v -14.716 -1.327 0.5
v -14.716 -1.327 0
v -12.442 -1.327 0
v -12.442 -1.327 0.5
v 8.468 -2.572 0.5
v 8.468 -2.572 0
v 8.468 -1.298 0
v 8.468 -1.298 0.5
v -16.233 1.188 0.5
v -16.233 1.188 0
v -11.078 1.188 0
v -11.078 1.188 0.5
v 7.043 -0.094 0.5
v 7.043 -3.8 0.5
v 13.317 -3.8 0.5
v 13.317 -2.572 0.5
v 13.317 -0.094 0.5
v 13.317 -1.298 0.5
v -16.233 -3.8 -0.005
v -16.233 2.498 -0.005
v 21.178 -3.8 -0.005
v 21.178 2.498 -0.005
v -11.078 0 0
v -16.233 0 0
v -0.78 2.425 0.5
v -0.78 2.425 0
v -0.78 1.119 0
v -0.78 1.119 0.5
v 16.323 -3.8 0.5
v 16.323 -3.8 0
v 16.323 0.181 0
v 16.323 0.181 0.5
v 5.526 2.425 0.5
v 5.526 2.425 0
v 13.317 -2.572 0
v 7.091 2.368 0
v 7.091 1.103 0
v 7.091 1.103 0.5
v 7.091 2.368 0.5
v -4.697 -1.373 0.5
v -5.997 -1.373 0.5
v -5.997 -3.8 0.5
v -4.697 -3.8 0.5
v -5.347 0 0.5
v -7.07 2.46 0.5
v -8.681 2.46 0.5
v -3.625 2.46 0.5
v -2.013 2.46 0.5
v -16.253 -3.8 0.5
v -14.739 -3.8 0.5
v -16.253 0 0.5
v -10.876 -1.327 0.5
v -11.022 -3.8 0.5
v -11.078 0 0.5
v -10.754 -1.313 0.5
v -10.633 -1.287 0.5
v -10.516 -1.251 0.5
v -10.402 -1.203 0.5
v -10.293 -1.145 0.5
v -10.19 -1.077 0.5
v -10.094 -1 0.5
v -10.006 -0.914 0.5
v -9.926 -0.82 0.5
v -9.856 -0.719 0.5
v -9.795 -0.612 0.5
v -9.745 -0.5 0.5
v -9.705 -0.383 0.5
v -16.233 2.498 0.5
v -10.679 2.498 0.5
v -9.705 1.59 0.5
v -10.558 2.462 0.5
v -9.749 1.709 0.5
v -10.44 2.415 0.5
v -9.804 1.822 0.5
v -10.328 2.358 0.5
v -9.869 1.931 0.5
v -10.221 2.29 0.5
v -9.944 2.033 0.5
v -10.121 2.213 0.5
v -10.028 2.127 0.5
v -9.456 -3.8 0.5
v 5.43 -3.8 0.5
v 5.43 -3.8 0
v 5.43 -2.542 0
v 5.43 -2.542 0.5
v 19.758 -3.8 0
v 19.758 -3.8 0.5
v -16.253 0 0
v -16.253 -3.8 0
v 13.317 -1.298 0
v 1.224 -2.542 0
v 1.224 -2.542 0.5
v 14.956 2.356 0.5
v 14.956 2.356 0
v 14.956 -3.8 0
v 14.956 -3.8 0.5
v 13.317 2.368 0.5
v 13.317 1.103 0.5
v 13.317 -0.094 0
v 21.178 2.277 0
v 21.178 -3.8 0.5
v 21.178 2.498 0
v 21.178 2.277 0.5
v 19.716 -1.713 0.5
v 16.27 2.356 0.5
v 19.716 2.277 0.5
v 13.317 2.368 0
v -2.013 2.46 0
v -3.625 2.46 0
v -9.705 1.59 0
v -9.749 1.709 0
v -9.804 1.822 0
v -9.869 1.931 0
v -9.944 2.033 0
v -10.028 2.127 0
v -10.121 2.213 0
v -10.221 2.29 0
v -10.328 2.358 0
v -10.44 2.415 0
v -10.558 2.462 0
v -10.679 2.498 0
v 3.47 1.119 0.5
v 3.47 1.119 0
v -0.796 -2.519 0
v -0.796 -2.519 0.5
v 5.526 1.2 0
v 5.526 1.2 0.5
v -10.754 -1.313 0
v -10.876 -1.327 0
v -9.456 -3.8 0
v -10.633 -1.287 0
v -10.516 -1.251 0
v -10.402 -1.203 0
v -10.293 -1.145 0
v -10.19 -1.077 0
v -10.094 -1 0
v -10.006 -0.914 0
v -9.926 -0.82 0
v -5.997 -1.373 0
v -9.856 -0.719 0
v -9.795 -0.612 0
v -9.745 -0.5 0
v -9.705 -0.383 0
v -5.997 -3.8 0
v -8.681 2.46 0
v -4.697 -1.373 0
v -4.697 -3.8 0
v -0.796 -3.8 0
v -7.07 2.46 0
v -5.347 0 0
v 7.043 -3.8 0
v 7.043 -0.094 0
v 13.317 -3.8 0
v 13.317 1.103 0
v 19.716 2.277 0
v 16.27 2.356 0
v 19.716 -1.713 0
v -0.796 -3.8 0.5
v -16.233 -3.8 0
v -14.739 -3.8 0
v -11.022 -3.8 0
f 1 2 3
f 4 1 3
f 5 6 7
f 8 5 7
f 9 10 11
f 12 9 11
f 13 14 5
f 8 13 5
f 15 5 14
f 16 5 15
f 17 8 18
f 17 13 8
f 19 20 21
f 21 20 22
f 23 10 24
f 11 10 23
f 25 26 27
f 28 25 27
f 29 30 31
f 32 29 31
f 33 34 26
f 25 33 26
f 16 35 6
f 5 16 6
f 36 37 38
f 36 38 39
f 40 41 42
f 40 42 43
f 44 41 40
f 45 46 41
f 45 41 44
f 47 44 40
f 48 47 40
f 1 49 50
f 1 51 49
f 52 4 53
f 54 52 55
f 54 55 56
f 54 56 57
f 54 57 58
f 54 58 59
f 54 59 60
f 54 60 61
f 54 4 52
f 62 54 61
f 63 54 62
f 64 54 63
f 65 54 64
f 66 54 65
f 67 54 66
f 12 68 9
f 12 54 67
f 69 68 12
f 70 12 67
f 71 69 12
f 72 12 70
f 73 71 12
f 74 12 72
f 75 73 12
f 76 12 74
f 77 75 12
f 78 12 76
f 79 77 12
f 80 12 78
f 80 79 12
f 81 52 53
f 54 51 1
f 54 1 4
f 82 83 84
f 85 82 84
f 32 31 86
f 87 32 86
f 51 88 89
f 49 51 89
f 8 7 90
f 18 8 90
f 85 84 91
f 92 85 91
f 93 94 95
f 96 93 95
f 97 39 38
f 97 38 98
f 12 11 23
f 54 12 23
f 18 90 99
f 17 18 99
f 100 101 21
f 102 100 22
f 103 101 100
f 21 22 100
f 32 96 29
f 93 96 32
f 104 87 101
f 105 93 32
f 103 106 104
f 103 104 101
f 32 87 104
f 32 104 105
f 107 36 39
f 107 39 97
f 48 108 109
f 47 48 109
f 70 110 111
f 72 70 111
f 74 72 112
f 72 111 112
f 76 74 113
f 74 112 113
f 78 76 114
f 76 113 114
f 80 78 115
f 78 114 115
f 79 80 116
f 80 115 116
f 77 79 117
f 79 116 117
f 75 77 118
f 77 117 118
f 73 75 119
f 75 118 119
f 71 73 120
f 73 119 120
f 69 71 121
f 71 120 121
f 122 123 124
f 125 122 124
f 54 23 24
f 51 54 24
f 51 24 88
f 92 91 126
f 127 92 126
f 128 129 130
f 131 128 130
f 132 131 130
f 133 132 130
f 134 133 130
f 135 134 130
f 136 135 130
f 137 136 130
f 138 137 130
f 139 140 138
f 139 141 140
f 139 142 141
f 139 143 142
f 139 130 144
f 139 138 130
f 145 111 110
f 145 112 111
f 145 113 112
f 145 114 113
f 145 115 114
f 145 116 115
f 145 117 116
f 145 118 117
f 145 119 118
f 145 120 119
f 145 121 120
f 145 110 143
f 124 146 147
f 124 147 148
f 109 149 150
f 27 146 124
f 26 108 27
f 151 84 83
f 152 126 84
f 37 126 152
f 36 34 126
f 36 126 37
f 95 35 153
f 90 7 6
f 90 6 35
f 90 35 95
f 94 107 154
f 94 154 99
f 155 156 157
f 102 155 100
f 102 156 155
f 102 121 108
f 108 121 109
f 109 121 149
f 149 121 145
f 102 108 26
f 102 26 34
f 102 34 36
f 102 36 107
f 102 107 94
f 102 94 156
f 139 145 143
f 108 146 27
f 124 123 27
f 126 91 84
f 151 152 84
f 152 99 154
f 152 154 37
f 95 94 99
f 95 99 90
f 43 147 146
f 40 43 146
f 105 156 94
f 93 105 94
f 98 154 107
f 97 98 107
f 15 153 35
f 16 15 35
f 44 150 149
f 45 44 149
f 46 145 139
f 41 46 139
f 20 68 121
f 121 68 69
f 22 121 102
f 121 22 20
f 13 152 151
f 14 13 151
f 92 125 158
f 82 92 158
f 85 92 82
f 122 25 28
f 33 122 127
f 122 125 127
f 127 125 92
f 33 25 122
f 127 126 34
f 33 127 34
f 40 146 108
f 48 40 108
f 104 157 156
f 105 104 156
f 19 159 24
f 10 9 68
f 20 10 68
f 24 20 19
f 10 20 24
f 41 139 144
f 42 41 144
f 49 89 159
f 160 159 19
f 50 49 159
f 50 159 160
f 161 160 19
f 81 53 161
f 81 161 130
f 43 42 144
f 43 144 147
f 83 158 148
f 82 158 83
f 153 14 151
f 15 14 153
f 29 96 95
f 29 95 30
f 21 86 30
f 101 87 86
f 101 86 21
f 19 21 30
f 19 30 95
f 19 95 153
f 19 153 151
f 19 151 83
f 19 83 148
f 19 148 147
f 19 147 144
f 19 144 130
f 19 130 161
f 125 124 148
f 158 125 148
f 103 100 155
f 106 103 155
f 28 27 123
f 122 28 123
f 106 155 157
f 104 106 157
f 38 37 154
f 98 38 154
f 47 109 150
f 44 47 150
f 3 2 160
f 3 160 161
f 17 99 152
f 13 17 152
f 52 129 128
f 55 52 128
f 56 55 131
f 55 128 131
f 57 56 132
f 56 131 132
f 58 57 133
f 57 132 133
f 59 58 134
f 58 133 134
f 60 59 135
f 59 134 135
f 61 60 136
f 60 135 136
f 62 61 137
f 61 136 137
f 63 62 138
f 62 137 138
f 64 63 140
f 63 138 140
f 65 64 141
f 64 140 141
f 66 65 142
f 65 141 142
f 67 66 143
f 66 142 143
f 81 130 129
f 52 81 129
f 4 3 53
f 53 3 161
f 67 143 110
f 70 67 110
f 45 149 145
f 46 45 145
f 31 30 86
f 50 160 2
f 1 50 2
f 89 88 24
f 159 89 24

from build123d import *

# Parameters (mm, degrees)
F4_DEPTH = 1
F3_W     = 12.4513199553
F3_H     = 2.5294316001
F5_W     = 74.8214920866
F5_H     = 12.595169118
F6_DEPTH = 0.01
F7_SCALE = 0.5


with BuildPart() as f4:
    # F3 (on Top) → F4 (new body)
    with BuildSketch(Plane.XY):
        with BuildLine():
            Line((-32.5062275336, -7.6), (-29.4775575647, -7.6))
            Line((-29.4775575647, -7.6), (-29.4327614695, -2.6532297294))
            Line((-29.4327614695, -2.6532297294), (-24.8831383838, -2.6532297294))
            Line((-24.8831383838, -2.6532297294), (-22.0433248124, -7.6))
            Line((-22.0433248124, -7.6), (-18.9124204973, -7.6))
            Line((-18.9124204973, -7.6), (-21.7522340687, -2.6532297294))
            ThreePointArc((-21.7522340687, -2.6532297294), (-20.2830658587, -2.0796278446), (-19.4100086076, -0.7661418768))
            Line((-19.4100086076, -0.7661418768), (-19.4100086076, 3.1799558435))
            ThreePointArc((-19.4100086076, 3.1799558435), (-20.1465672733, 4.3424852653), (-21.3581765803, 4.995169118))
            Line((-21.3581765803, 4.995169118), (-32.4662169309, 4.995169118))
            Line((-32.4662169309, 4.995169118), (-32.4662169309, 2.3768300461))
            Line((-32.4662169309, 2.3768300461), (-22.156490013, 2.3768300461))
            Line((-22.156490013, 2.3768300461), (-22.156490013, 0))
            Line((-22.156490013, 0), (-32.5062275336, 0))
            Line((-32.5062275336, 0), (-32.5062275336, -7.6))
        make_face()
    extrude(amount=F4_DEPTH)



with BuildPart() as f4b:
    # F3 (on Top) → F4, piece 2 (new body)
    with BuildSketch(Plane.XY):
        Polygon((-14.1395051198, 4.9199829809), (-17.3628383068, 4.9199829809), (-11.9944959487, -2.7468044573), (-11.9944959487, -7.6), (-9.3944959487, -7.6), (-9.3944959487, -2.7468044573), (-4.0261535905, 4.9199829809), (-7.2494867775, 4.9199829809), (-10.6944959487, 0), align=None)
    extrude(amount=F4_DEPTH)


with BuildPart() as f4c:
    # F3 (on Top) → F4, piece 3 (new body)
    with BuildSketch(Plane.XY):
        Polygon((-1.5607364842, 4.8494239393), (-1.5607364842, 2.2384772427), (6.939469985, 2.2384772427), (-1.5920158667, -5.0374310329), (-1.5920158667, -7.6), (10.8593031573, -7.6), (10.8593031573, -5.0839300849), (2.4482466872, -5.0839300849), (11.0528468894, 2.399763919), (11.0528468894, 4.8494239393), align=None)
    extrude(amount=F4_DEPTH)


with BuildPart() as f4d:
    # F3 (on Top) → F4, piece 4 (new body)
    with BuildSketch(Plane.XY):
        with Locations((20.4074648017, 3.4706616363)):
            Rectangle(F3_W, F3_H)
    extrude(amount=F4_DEPTH)


with BuildPart() as f4e:
    # F3 (on Top) → F4, piece 5 (new body)
    with BuildSketch(Plane.XY):
        Polygon((14.0850310954, -7.6), (26.6331247794, -7.6), (26.6331247794, -5.1448669866), (16.9365629362, -5.1448669866), (16.9365629362, -2.5965400156), (26.6331247794, -2.5965400156), (26.6331247794, -0.1888843136), (14.0850310954, -0.1888843136), align=None)
    extrude(amount=F4_DEPTH)


with BuildPart() as f4f:
    # F3 (on Top) → F4, piece 6 (new body)
    with BuildSketch(Plane.XY):
        Polygon((29.911786692, -7.6), (32.6458275334, -7.6), (32.6458275334, 0.3624289589), (39.5166337506, -7.6), (42.3552751557, -7.6), (42.3552751557, 4.5534580069), (39.4317097559, 4.5534580069), (39.4317097559, -3.4268074825), (32.5400491226, 4.7125679496), (29.911786692, 4.7125679496), align=None)
    extrude(amount=F4_DEPTH)


with BuildPart() as f4_1:
    add(f4.part)

    add(f4b.part)  # F6 merges F4b

    add(f4c.part)  # F6 merges F4c

    add(f4d.part)  # F6 merges F4d

    add(f4e.part)  # F6 merges F4e

    add(f4f.part)  # F6 merges F4f
    # F5 (on Top) → F6 (join)
    with BuildSketch(Plane.XY):
        with Locations((4.9445291124, -1.302415441)):
            Rectangle(F5_W, F5_H)
    extrude(amount=-F6_DEPTH)


with BuildPart() as f4_2:
    # F7: moved
    add(f4_1.part.scale(F7_SCALE))


solid = f4_2.part
